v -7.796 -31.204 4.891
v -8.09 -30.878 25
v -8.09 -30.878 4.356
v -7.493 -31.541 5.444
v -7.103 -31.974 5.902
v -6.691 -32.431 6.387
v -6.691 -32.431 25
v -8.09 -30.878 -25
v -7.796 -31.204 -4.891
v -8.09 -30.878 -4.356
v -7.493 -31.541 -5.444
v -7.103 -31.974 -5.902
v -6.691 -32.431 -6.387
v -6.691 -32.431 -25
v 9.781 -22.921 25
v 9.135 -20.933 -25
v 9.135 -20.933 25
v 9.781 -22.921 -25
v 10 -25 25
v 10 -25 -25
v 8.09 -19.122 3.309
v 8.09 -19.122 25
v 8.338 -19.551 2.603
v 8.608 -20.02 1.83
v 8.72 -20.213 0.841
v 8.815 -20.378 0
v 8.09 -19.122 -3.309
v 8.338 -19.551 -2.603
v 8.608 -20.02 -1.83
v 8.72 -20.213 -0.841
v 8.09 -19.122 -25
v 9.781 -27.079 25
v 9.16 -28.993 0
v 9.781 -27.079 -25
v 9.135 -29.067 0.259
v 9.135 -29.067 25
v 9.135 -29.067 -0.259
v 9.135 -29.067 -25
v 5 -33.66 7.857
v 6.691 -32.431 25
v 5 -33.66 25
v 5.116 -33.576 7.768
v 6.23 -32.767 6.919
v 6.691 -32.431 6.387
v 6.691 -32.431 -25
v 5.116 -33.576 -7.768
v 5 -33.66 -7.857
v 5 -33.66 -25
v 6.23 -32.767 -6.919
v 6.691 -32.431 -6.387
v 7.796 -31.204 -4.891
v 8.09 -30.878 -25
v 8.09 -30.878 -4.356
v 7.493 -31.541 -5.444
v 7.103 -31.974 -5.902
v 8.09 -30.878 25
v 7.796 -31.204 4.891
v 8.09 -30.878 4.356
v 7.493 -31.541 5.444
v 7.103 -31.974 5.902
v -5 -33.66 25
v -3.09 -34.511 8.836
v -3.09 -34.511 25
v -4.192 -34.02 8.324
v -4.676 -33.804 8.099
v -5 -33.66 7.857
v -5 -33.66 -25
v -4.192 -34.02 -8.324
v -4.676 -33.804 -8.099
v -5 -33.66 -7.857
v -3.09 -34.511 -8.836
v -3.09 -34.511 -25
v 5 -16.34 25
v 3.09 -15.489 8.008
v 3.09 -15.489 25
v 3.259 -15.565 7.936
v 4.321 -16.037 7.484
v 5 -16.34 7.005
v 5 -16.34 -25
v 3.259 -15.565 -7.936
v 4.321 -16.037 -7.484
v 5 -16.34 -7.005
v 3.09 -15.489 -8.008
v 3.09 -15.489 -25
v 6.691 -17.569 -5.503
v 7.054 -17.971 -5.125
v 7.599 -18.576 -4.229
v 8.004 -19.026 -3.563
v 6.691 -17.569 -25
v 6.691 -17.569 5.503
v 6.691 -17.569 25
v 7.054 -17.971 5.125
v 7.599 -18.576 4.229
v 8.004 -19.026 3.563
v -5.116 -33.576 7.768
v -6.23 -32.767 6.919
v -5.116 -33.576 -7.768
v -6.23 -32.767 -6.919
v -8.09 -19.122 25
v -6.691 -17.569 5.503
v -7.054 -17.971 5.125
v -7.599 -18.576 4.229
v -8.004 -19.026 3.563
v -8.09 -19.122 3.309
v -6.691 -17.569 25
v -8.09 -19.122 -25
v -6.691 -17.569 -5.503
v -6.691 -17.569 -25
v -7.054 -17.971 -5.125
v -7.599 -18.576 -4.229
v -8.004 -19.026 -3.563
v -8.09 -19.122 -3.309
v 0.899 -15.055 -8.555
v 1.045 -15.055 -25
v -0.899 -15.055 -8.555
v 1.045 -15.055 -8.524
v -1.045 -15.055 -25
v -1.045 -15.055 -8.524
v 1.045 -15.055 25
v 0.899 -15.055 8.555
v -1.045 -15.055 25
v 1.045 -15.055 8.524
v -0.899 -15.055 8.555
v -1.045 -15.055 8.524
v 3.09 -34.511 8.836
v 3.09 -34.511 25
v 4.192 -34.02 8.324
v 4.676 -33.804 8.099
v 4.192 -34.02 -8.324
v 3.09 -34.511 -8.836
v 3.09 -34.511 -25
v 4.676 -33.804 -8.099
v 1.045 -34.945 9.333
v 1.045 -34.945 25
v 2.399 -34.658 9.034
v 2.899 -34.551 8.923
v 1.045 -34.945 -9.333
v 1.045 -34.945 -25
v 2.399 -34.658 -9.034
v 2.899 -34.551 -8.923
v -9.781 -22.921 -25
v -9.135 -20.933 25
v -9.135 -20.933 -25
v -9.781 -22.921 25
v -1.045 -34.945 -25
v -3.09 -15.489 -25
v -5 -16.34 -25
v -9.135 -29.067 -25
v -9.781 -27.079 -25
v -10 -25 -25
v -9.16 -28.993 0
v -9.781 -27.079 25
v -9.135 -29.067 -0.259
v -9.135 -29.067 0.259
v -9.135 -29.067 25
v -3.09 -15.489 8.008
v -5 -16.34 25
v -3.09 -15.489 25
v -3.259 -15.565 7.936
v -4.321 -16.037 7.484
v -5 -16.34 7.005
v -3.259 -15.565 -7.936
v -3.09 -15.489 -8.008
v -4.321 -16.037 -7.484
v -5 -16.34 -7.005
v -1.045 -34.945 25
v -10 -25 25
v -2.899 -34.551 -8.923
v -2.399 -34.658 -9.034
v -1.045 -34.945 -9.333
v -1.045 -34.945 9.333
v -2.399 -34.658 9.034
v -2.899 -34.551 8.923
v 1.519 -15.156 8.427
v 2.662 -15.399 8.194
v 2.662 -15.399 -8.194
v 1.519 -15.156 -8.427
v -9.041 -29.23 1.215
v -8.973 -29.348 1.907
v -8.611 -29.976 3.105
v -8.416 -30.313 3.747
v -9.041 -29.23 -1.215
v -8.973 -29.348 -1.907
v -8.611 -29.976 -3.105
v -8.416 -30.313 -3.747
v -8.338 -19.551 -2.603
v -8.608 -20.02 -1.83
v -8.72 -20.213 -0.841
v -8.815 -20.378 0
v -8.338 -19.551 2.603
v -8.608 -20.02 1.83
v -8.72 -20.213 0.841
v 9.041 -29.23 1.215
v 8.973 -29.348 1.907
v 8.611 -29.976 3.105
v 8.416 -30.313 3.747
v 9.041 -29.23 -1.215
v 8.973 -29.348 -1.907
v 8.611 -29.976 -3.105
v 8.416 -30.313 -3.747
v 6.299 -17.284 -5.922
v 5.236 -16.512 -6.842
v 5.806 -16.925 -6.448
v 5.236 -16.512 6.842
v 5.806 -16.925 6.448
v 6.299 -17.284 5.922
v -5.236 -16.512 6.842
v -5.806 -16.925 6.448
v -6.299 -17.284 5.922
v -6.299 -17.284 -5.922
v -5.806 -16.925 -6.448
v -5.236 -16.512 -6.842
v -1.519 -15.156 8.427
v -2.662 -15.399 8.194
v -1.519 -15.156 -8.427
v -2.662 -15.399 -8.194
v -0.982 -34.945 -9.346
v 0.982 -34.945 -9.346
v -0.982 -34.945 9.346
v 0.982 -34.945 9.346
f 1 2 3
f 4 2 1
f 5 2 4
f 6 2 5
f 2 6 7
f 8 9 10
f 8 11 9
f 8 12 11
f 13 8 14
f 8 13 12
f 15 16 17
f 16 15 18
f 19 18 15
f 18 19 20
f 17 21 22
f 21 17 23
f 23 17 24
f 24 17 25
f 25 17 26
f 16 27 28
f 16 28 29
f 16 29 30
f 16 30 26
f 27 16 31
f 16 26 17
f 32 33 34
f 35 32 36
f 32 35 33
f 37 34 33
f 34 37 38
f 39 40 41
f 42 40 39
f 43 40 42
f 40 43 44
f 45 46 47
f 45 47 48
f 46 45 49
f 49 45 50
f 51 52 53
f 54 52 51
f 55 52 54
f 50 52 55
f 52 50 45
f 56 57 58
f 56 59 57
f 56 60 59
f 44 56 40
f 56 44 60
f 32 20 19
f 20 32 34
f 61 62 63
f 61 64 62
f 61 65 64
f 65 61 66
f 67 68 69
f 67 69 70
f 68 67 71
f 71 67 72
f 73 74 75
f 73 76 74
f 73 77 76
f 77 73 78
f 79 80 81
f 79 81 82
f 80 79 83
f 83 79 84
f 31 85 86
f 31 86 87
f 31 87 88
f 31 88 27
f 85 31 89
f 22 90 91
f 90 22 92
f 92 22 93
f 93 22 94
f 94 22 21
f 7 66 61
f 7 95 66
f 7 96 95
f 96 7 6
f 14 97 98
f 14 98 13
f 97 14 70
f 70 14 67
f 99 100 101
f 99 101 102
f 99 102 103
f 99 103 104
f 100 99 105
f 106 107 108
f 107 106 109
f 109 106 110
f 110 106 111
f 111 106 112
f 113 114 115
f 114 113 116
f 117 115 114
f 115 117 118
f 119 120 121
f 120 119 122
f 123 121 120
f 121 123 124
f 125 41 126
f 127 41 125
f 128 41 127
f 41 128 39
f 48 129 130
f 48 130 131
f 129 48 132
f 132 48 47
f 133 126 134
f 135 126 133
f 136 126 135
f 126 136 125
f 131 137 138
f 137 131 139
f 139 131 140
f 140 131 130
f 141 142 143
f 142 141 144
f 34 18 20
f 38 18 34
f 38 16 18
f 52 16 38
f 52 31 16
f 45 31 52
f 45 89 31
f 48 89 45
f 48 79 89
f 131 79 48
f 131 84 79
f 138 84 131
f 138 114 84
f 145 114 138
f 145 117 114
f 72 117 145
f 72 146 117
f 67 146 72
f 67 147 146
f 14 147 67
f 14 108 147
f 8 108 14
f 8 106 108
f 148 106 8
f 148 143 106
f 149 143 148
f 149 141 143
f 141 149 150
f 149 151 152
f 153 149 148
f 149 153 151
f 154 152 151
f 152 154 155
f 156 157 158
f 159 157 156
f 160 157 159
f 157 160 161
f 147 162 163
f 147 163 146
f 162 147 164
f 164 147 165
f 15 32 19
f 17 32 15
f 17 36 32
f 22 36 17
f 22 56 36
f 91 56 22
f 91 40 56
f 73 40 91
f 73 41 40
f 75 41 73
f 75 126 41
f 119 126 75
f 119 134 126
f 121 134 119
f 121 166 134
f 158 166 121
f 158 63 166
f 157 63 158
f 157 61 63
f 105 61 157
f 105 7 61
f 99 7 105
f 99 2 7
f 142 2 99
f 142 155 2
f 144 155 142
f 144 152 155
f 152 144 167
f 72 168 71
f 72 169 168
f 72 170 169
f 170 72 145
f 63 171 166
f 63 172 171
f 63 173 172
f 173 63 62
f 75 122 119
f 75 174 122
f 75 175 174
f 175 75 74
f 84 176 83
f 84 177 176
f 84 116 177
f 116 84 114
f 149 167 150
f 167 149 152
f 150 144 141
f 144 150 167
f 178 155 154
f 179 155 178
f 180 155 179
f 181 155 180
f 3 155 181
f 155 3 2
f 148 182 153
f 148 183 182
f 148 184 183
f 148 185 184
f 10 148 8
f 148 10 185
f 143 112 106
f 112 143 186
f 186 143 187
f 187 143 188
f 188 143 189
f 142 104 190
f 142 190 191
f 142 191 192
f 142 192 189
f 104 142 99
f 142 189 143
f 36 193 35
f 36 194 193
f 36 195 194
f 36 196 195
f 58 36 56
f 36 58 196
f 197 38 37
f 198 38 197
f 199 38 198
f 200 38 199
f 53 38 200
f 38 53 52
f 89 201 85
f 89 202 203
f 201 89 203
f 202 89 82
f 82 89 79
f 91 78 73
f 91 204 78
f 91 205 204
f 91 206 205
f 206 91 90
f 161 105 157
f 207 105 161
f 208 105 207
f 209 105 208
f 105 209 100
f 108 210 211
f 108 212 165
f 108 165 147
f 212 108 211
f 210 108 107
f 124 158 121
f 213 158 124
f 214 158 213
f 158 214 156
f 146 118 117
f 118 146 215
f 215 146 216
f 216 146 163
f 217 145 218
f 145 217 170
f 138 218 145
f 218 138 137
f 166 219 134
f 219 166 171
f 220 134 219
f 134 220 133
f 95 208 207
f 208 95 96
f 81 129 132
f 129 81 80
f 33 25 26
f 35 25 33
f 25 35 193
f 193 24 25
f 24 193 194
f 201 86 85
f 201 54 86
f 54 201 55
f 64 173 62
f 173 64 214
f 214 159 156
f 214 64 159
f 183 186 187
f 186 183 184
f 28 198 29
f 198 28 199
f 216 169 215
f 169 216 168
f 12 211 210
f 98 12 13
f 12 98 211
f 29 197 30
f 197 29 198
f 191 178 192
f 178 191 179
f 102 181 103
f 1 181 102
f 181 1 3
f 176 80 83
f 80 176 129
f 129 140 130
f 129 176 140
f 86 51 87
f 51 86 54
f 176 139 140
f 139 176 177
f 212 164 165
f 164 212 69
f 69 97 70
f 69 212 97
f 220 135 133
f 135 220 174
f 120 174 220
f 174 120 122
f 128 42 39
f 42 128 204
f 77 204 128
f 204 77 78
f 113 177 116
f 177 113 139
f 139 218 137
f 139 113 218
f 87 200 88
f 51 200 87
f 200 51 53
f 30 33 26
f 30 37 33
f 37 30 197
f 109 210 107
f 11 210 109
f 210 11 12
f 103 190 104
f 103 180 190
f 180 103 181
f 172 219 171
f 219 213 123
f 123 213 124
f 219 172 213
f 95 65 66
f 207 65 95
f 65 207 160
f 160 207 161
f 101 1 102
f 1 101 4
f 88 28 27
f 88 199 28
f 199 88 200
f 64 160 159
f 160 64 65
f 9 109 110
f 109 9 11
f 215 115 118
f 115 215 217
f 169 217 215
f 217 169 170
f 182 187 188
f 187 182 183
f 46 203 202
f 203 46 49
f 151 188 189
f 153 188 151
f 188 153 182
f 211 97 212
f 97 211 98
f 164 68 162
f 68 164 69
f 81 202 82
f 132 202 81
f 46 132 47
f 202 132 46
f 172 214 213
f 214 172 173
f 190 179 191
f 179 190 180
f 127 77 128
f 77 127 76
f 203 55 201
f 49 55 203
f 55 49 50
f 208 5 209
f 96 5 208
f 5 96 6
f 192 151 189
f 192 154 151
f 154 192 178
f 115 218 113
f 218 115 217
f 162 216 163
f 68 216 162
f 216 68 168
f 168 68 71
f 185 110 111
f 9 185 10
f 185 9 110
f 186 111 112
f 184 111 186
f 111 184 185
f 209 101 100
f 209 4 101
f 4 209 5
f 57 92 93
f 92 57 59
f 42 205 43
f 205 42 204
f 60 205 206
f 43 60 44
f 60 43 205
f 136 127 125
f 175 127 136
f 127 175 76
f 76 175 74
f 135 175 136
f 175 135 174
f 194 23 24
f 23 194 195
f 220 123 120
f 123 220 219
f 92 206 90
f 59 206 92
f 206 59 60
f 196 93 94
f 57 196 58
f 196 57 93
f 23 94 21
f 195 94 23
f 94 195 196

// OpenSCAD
module base_cylinder() {
  cylinder(50, 10, 10);
}

difference() {
  translate([0, -25, -25])
  base_cylinder();

  rotate([90, 0, 0])
  cylinder(50, 8, 10);
}
